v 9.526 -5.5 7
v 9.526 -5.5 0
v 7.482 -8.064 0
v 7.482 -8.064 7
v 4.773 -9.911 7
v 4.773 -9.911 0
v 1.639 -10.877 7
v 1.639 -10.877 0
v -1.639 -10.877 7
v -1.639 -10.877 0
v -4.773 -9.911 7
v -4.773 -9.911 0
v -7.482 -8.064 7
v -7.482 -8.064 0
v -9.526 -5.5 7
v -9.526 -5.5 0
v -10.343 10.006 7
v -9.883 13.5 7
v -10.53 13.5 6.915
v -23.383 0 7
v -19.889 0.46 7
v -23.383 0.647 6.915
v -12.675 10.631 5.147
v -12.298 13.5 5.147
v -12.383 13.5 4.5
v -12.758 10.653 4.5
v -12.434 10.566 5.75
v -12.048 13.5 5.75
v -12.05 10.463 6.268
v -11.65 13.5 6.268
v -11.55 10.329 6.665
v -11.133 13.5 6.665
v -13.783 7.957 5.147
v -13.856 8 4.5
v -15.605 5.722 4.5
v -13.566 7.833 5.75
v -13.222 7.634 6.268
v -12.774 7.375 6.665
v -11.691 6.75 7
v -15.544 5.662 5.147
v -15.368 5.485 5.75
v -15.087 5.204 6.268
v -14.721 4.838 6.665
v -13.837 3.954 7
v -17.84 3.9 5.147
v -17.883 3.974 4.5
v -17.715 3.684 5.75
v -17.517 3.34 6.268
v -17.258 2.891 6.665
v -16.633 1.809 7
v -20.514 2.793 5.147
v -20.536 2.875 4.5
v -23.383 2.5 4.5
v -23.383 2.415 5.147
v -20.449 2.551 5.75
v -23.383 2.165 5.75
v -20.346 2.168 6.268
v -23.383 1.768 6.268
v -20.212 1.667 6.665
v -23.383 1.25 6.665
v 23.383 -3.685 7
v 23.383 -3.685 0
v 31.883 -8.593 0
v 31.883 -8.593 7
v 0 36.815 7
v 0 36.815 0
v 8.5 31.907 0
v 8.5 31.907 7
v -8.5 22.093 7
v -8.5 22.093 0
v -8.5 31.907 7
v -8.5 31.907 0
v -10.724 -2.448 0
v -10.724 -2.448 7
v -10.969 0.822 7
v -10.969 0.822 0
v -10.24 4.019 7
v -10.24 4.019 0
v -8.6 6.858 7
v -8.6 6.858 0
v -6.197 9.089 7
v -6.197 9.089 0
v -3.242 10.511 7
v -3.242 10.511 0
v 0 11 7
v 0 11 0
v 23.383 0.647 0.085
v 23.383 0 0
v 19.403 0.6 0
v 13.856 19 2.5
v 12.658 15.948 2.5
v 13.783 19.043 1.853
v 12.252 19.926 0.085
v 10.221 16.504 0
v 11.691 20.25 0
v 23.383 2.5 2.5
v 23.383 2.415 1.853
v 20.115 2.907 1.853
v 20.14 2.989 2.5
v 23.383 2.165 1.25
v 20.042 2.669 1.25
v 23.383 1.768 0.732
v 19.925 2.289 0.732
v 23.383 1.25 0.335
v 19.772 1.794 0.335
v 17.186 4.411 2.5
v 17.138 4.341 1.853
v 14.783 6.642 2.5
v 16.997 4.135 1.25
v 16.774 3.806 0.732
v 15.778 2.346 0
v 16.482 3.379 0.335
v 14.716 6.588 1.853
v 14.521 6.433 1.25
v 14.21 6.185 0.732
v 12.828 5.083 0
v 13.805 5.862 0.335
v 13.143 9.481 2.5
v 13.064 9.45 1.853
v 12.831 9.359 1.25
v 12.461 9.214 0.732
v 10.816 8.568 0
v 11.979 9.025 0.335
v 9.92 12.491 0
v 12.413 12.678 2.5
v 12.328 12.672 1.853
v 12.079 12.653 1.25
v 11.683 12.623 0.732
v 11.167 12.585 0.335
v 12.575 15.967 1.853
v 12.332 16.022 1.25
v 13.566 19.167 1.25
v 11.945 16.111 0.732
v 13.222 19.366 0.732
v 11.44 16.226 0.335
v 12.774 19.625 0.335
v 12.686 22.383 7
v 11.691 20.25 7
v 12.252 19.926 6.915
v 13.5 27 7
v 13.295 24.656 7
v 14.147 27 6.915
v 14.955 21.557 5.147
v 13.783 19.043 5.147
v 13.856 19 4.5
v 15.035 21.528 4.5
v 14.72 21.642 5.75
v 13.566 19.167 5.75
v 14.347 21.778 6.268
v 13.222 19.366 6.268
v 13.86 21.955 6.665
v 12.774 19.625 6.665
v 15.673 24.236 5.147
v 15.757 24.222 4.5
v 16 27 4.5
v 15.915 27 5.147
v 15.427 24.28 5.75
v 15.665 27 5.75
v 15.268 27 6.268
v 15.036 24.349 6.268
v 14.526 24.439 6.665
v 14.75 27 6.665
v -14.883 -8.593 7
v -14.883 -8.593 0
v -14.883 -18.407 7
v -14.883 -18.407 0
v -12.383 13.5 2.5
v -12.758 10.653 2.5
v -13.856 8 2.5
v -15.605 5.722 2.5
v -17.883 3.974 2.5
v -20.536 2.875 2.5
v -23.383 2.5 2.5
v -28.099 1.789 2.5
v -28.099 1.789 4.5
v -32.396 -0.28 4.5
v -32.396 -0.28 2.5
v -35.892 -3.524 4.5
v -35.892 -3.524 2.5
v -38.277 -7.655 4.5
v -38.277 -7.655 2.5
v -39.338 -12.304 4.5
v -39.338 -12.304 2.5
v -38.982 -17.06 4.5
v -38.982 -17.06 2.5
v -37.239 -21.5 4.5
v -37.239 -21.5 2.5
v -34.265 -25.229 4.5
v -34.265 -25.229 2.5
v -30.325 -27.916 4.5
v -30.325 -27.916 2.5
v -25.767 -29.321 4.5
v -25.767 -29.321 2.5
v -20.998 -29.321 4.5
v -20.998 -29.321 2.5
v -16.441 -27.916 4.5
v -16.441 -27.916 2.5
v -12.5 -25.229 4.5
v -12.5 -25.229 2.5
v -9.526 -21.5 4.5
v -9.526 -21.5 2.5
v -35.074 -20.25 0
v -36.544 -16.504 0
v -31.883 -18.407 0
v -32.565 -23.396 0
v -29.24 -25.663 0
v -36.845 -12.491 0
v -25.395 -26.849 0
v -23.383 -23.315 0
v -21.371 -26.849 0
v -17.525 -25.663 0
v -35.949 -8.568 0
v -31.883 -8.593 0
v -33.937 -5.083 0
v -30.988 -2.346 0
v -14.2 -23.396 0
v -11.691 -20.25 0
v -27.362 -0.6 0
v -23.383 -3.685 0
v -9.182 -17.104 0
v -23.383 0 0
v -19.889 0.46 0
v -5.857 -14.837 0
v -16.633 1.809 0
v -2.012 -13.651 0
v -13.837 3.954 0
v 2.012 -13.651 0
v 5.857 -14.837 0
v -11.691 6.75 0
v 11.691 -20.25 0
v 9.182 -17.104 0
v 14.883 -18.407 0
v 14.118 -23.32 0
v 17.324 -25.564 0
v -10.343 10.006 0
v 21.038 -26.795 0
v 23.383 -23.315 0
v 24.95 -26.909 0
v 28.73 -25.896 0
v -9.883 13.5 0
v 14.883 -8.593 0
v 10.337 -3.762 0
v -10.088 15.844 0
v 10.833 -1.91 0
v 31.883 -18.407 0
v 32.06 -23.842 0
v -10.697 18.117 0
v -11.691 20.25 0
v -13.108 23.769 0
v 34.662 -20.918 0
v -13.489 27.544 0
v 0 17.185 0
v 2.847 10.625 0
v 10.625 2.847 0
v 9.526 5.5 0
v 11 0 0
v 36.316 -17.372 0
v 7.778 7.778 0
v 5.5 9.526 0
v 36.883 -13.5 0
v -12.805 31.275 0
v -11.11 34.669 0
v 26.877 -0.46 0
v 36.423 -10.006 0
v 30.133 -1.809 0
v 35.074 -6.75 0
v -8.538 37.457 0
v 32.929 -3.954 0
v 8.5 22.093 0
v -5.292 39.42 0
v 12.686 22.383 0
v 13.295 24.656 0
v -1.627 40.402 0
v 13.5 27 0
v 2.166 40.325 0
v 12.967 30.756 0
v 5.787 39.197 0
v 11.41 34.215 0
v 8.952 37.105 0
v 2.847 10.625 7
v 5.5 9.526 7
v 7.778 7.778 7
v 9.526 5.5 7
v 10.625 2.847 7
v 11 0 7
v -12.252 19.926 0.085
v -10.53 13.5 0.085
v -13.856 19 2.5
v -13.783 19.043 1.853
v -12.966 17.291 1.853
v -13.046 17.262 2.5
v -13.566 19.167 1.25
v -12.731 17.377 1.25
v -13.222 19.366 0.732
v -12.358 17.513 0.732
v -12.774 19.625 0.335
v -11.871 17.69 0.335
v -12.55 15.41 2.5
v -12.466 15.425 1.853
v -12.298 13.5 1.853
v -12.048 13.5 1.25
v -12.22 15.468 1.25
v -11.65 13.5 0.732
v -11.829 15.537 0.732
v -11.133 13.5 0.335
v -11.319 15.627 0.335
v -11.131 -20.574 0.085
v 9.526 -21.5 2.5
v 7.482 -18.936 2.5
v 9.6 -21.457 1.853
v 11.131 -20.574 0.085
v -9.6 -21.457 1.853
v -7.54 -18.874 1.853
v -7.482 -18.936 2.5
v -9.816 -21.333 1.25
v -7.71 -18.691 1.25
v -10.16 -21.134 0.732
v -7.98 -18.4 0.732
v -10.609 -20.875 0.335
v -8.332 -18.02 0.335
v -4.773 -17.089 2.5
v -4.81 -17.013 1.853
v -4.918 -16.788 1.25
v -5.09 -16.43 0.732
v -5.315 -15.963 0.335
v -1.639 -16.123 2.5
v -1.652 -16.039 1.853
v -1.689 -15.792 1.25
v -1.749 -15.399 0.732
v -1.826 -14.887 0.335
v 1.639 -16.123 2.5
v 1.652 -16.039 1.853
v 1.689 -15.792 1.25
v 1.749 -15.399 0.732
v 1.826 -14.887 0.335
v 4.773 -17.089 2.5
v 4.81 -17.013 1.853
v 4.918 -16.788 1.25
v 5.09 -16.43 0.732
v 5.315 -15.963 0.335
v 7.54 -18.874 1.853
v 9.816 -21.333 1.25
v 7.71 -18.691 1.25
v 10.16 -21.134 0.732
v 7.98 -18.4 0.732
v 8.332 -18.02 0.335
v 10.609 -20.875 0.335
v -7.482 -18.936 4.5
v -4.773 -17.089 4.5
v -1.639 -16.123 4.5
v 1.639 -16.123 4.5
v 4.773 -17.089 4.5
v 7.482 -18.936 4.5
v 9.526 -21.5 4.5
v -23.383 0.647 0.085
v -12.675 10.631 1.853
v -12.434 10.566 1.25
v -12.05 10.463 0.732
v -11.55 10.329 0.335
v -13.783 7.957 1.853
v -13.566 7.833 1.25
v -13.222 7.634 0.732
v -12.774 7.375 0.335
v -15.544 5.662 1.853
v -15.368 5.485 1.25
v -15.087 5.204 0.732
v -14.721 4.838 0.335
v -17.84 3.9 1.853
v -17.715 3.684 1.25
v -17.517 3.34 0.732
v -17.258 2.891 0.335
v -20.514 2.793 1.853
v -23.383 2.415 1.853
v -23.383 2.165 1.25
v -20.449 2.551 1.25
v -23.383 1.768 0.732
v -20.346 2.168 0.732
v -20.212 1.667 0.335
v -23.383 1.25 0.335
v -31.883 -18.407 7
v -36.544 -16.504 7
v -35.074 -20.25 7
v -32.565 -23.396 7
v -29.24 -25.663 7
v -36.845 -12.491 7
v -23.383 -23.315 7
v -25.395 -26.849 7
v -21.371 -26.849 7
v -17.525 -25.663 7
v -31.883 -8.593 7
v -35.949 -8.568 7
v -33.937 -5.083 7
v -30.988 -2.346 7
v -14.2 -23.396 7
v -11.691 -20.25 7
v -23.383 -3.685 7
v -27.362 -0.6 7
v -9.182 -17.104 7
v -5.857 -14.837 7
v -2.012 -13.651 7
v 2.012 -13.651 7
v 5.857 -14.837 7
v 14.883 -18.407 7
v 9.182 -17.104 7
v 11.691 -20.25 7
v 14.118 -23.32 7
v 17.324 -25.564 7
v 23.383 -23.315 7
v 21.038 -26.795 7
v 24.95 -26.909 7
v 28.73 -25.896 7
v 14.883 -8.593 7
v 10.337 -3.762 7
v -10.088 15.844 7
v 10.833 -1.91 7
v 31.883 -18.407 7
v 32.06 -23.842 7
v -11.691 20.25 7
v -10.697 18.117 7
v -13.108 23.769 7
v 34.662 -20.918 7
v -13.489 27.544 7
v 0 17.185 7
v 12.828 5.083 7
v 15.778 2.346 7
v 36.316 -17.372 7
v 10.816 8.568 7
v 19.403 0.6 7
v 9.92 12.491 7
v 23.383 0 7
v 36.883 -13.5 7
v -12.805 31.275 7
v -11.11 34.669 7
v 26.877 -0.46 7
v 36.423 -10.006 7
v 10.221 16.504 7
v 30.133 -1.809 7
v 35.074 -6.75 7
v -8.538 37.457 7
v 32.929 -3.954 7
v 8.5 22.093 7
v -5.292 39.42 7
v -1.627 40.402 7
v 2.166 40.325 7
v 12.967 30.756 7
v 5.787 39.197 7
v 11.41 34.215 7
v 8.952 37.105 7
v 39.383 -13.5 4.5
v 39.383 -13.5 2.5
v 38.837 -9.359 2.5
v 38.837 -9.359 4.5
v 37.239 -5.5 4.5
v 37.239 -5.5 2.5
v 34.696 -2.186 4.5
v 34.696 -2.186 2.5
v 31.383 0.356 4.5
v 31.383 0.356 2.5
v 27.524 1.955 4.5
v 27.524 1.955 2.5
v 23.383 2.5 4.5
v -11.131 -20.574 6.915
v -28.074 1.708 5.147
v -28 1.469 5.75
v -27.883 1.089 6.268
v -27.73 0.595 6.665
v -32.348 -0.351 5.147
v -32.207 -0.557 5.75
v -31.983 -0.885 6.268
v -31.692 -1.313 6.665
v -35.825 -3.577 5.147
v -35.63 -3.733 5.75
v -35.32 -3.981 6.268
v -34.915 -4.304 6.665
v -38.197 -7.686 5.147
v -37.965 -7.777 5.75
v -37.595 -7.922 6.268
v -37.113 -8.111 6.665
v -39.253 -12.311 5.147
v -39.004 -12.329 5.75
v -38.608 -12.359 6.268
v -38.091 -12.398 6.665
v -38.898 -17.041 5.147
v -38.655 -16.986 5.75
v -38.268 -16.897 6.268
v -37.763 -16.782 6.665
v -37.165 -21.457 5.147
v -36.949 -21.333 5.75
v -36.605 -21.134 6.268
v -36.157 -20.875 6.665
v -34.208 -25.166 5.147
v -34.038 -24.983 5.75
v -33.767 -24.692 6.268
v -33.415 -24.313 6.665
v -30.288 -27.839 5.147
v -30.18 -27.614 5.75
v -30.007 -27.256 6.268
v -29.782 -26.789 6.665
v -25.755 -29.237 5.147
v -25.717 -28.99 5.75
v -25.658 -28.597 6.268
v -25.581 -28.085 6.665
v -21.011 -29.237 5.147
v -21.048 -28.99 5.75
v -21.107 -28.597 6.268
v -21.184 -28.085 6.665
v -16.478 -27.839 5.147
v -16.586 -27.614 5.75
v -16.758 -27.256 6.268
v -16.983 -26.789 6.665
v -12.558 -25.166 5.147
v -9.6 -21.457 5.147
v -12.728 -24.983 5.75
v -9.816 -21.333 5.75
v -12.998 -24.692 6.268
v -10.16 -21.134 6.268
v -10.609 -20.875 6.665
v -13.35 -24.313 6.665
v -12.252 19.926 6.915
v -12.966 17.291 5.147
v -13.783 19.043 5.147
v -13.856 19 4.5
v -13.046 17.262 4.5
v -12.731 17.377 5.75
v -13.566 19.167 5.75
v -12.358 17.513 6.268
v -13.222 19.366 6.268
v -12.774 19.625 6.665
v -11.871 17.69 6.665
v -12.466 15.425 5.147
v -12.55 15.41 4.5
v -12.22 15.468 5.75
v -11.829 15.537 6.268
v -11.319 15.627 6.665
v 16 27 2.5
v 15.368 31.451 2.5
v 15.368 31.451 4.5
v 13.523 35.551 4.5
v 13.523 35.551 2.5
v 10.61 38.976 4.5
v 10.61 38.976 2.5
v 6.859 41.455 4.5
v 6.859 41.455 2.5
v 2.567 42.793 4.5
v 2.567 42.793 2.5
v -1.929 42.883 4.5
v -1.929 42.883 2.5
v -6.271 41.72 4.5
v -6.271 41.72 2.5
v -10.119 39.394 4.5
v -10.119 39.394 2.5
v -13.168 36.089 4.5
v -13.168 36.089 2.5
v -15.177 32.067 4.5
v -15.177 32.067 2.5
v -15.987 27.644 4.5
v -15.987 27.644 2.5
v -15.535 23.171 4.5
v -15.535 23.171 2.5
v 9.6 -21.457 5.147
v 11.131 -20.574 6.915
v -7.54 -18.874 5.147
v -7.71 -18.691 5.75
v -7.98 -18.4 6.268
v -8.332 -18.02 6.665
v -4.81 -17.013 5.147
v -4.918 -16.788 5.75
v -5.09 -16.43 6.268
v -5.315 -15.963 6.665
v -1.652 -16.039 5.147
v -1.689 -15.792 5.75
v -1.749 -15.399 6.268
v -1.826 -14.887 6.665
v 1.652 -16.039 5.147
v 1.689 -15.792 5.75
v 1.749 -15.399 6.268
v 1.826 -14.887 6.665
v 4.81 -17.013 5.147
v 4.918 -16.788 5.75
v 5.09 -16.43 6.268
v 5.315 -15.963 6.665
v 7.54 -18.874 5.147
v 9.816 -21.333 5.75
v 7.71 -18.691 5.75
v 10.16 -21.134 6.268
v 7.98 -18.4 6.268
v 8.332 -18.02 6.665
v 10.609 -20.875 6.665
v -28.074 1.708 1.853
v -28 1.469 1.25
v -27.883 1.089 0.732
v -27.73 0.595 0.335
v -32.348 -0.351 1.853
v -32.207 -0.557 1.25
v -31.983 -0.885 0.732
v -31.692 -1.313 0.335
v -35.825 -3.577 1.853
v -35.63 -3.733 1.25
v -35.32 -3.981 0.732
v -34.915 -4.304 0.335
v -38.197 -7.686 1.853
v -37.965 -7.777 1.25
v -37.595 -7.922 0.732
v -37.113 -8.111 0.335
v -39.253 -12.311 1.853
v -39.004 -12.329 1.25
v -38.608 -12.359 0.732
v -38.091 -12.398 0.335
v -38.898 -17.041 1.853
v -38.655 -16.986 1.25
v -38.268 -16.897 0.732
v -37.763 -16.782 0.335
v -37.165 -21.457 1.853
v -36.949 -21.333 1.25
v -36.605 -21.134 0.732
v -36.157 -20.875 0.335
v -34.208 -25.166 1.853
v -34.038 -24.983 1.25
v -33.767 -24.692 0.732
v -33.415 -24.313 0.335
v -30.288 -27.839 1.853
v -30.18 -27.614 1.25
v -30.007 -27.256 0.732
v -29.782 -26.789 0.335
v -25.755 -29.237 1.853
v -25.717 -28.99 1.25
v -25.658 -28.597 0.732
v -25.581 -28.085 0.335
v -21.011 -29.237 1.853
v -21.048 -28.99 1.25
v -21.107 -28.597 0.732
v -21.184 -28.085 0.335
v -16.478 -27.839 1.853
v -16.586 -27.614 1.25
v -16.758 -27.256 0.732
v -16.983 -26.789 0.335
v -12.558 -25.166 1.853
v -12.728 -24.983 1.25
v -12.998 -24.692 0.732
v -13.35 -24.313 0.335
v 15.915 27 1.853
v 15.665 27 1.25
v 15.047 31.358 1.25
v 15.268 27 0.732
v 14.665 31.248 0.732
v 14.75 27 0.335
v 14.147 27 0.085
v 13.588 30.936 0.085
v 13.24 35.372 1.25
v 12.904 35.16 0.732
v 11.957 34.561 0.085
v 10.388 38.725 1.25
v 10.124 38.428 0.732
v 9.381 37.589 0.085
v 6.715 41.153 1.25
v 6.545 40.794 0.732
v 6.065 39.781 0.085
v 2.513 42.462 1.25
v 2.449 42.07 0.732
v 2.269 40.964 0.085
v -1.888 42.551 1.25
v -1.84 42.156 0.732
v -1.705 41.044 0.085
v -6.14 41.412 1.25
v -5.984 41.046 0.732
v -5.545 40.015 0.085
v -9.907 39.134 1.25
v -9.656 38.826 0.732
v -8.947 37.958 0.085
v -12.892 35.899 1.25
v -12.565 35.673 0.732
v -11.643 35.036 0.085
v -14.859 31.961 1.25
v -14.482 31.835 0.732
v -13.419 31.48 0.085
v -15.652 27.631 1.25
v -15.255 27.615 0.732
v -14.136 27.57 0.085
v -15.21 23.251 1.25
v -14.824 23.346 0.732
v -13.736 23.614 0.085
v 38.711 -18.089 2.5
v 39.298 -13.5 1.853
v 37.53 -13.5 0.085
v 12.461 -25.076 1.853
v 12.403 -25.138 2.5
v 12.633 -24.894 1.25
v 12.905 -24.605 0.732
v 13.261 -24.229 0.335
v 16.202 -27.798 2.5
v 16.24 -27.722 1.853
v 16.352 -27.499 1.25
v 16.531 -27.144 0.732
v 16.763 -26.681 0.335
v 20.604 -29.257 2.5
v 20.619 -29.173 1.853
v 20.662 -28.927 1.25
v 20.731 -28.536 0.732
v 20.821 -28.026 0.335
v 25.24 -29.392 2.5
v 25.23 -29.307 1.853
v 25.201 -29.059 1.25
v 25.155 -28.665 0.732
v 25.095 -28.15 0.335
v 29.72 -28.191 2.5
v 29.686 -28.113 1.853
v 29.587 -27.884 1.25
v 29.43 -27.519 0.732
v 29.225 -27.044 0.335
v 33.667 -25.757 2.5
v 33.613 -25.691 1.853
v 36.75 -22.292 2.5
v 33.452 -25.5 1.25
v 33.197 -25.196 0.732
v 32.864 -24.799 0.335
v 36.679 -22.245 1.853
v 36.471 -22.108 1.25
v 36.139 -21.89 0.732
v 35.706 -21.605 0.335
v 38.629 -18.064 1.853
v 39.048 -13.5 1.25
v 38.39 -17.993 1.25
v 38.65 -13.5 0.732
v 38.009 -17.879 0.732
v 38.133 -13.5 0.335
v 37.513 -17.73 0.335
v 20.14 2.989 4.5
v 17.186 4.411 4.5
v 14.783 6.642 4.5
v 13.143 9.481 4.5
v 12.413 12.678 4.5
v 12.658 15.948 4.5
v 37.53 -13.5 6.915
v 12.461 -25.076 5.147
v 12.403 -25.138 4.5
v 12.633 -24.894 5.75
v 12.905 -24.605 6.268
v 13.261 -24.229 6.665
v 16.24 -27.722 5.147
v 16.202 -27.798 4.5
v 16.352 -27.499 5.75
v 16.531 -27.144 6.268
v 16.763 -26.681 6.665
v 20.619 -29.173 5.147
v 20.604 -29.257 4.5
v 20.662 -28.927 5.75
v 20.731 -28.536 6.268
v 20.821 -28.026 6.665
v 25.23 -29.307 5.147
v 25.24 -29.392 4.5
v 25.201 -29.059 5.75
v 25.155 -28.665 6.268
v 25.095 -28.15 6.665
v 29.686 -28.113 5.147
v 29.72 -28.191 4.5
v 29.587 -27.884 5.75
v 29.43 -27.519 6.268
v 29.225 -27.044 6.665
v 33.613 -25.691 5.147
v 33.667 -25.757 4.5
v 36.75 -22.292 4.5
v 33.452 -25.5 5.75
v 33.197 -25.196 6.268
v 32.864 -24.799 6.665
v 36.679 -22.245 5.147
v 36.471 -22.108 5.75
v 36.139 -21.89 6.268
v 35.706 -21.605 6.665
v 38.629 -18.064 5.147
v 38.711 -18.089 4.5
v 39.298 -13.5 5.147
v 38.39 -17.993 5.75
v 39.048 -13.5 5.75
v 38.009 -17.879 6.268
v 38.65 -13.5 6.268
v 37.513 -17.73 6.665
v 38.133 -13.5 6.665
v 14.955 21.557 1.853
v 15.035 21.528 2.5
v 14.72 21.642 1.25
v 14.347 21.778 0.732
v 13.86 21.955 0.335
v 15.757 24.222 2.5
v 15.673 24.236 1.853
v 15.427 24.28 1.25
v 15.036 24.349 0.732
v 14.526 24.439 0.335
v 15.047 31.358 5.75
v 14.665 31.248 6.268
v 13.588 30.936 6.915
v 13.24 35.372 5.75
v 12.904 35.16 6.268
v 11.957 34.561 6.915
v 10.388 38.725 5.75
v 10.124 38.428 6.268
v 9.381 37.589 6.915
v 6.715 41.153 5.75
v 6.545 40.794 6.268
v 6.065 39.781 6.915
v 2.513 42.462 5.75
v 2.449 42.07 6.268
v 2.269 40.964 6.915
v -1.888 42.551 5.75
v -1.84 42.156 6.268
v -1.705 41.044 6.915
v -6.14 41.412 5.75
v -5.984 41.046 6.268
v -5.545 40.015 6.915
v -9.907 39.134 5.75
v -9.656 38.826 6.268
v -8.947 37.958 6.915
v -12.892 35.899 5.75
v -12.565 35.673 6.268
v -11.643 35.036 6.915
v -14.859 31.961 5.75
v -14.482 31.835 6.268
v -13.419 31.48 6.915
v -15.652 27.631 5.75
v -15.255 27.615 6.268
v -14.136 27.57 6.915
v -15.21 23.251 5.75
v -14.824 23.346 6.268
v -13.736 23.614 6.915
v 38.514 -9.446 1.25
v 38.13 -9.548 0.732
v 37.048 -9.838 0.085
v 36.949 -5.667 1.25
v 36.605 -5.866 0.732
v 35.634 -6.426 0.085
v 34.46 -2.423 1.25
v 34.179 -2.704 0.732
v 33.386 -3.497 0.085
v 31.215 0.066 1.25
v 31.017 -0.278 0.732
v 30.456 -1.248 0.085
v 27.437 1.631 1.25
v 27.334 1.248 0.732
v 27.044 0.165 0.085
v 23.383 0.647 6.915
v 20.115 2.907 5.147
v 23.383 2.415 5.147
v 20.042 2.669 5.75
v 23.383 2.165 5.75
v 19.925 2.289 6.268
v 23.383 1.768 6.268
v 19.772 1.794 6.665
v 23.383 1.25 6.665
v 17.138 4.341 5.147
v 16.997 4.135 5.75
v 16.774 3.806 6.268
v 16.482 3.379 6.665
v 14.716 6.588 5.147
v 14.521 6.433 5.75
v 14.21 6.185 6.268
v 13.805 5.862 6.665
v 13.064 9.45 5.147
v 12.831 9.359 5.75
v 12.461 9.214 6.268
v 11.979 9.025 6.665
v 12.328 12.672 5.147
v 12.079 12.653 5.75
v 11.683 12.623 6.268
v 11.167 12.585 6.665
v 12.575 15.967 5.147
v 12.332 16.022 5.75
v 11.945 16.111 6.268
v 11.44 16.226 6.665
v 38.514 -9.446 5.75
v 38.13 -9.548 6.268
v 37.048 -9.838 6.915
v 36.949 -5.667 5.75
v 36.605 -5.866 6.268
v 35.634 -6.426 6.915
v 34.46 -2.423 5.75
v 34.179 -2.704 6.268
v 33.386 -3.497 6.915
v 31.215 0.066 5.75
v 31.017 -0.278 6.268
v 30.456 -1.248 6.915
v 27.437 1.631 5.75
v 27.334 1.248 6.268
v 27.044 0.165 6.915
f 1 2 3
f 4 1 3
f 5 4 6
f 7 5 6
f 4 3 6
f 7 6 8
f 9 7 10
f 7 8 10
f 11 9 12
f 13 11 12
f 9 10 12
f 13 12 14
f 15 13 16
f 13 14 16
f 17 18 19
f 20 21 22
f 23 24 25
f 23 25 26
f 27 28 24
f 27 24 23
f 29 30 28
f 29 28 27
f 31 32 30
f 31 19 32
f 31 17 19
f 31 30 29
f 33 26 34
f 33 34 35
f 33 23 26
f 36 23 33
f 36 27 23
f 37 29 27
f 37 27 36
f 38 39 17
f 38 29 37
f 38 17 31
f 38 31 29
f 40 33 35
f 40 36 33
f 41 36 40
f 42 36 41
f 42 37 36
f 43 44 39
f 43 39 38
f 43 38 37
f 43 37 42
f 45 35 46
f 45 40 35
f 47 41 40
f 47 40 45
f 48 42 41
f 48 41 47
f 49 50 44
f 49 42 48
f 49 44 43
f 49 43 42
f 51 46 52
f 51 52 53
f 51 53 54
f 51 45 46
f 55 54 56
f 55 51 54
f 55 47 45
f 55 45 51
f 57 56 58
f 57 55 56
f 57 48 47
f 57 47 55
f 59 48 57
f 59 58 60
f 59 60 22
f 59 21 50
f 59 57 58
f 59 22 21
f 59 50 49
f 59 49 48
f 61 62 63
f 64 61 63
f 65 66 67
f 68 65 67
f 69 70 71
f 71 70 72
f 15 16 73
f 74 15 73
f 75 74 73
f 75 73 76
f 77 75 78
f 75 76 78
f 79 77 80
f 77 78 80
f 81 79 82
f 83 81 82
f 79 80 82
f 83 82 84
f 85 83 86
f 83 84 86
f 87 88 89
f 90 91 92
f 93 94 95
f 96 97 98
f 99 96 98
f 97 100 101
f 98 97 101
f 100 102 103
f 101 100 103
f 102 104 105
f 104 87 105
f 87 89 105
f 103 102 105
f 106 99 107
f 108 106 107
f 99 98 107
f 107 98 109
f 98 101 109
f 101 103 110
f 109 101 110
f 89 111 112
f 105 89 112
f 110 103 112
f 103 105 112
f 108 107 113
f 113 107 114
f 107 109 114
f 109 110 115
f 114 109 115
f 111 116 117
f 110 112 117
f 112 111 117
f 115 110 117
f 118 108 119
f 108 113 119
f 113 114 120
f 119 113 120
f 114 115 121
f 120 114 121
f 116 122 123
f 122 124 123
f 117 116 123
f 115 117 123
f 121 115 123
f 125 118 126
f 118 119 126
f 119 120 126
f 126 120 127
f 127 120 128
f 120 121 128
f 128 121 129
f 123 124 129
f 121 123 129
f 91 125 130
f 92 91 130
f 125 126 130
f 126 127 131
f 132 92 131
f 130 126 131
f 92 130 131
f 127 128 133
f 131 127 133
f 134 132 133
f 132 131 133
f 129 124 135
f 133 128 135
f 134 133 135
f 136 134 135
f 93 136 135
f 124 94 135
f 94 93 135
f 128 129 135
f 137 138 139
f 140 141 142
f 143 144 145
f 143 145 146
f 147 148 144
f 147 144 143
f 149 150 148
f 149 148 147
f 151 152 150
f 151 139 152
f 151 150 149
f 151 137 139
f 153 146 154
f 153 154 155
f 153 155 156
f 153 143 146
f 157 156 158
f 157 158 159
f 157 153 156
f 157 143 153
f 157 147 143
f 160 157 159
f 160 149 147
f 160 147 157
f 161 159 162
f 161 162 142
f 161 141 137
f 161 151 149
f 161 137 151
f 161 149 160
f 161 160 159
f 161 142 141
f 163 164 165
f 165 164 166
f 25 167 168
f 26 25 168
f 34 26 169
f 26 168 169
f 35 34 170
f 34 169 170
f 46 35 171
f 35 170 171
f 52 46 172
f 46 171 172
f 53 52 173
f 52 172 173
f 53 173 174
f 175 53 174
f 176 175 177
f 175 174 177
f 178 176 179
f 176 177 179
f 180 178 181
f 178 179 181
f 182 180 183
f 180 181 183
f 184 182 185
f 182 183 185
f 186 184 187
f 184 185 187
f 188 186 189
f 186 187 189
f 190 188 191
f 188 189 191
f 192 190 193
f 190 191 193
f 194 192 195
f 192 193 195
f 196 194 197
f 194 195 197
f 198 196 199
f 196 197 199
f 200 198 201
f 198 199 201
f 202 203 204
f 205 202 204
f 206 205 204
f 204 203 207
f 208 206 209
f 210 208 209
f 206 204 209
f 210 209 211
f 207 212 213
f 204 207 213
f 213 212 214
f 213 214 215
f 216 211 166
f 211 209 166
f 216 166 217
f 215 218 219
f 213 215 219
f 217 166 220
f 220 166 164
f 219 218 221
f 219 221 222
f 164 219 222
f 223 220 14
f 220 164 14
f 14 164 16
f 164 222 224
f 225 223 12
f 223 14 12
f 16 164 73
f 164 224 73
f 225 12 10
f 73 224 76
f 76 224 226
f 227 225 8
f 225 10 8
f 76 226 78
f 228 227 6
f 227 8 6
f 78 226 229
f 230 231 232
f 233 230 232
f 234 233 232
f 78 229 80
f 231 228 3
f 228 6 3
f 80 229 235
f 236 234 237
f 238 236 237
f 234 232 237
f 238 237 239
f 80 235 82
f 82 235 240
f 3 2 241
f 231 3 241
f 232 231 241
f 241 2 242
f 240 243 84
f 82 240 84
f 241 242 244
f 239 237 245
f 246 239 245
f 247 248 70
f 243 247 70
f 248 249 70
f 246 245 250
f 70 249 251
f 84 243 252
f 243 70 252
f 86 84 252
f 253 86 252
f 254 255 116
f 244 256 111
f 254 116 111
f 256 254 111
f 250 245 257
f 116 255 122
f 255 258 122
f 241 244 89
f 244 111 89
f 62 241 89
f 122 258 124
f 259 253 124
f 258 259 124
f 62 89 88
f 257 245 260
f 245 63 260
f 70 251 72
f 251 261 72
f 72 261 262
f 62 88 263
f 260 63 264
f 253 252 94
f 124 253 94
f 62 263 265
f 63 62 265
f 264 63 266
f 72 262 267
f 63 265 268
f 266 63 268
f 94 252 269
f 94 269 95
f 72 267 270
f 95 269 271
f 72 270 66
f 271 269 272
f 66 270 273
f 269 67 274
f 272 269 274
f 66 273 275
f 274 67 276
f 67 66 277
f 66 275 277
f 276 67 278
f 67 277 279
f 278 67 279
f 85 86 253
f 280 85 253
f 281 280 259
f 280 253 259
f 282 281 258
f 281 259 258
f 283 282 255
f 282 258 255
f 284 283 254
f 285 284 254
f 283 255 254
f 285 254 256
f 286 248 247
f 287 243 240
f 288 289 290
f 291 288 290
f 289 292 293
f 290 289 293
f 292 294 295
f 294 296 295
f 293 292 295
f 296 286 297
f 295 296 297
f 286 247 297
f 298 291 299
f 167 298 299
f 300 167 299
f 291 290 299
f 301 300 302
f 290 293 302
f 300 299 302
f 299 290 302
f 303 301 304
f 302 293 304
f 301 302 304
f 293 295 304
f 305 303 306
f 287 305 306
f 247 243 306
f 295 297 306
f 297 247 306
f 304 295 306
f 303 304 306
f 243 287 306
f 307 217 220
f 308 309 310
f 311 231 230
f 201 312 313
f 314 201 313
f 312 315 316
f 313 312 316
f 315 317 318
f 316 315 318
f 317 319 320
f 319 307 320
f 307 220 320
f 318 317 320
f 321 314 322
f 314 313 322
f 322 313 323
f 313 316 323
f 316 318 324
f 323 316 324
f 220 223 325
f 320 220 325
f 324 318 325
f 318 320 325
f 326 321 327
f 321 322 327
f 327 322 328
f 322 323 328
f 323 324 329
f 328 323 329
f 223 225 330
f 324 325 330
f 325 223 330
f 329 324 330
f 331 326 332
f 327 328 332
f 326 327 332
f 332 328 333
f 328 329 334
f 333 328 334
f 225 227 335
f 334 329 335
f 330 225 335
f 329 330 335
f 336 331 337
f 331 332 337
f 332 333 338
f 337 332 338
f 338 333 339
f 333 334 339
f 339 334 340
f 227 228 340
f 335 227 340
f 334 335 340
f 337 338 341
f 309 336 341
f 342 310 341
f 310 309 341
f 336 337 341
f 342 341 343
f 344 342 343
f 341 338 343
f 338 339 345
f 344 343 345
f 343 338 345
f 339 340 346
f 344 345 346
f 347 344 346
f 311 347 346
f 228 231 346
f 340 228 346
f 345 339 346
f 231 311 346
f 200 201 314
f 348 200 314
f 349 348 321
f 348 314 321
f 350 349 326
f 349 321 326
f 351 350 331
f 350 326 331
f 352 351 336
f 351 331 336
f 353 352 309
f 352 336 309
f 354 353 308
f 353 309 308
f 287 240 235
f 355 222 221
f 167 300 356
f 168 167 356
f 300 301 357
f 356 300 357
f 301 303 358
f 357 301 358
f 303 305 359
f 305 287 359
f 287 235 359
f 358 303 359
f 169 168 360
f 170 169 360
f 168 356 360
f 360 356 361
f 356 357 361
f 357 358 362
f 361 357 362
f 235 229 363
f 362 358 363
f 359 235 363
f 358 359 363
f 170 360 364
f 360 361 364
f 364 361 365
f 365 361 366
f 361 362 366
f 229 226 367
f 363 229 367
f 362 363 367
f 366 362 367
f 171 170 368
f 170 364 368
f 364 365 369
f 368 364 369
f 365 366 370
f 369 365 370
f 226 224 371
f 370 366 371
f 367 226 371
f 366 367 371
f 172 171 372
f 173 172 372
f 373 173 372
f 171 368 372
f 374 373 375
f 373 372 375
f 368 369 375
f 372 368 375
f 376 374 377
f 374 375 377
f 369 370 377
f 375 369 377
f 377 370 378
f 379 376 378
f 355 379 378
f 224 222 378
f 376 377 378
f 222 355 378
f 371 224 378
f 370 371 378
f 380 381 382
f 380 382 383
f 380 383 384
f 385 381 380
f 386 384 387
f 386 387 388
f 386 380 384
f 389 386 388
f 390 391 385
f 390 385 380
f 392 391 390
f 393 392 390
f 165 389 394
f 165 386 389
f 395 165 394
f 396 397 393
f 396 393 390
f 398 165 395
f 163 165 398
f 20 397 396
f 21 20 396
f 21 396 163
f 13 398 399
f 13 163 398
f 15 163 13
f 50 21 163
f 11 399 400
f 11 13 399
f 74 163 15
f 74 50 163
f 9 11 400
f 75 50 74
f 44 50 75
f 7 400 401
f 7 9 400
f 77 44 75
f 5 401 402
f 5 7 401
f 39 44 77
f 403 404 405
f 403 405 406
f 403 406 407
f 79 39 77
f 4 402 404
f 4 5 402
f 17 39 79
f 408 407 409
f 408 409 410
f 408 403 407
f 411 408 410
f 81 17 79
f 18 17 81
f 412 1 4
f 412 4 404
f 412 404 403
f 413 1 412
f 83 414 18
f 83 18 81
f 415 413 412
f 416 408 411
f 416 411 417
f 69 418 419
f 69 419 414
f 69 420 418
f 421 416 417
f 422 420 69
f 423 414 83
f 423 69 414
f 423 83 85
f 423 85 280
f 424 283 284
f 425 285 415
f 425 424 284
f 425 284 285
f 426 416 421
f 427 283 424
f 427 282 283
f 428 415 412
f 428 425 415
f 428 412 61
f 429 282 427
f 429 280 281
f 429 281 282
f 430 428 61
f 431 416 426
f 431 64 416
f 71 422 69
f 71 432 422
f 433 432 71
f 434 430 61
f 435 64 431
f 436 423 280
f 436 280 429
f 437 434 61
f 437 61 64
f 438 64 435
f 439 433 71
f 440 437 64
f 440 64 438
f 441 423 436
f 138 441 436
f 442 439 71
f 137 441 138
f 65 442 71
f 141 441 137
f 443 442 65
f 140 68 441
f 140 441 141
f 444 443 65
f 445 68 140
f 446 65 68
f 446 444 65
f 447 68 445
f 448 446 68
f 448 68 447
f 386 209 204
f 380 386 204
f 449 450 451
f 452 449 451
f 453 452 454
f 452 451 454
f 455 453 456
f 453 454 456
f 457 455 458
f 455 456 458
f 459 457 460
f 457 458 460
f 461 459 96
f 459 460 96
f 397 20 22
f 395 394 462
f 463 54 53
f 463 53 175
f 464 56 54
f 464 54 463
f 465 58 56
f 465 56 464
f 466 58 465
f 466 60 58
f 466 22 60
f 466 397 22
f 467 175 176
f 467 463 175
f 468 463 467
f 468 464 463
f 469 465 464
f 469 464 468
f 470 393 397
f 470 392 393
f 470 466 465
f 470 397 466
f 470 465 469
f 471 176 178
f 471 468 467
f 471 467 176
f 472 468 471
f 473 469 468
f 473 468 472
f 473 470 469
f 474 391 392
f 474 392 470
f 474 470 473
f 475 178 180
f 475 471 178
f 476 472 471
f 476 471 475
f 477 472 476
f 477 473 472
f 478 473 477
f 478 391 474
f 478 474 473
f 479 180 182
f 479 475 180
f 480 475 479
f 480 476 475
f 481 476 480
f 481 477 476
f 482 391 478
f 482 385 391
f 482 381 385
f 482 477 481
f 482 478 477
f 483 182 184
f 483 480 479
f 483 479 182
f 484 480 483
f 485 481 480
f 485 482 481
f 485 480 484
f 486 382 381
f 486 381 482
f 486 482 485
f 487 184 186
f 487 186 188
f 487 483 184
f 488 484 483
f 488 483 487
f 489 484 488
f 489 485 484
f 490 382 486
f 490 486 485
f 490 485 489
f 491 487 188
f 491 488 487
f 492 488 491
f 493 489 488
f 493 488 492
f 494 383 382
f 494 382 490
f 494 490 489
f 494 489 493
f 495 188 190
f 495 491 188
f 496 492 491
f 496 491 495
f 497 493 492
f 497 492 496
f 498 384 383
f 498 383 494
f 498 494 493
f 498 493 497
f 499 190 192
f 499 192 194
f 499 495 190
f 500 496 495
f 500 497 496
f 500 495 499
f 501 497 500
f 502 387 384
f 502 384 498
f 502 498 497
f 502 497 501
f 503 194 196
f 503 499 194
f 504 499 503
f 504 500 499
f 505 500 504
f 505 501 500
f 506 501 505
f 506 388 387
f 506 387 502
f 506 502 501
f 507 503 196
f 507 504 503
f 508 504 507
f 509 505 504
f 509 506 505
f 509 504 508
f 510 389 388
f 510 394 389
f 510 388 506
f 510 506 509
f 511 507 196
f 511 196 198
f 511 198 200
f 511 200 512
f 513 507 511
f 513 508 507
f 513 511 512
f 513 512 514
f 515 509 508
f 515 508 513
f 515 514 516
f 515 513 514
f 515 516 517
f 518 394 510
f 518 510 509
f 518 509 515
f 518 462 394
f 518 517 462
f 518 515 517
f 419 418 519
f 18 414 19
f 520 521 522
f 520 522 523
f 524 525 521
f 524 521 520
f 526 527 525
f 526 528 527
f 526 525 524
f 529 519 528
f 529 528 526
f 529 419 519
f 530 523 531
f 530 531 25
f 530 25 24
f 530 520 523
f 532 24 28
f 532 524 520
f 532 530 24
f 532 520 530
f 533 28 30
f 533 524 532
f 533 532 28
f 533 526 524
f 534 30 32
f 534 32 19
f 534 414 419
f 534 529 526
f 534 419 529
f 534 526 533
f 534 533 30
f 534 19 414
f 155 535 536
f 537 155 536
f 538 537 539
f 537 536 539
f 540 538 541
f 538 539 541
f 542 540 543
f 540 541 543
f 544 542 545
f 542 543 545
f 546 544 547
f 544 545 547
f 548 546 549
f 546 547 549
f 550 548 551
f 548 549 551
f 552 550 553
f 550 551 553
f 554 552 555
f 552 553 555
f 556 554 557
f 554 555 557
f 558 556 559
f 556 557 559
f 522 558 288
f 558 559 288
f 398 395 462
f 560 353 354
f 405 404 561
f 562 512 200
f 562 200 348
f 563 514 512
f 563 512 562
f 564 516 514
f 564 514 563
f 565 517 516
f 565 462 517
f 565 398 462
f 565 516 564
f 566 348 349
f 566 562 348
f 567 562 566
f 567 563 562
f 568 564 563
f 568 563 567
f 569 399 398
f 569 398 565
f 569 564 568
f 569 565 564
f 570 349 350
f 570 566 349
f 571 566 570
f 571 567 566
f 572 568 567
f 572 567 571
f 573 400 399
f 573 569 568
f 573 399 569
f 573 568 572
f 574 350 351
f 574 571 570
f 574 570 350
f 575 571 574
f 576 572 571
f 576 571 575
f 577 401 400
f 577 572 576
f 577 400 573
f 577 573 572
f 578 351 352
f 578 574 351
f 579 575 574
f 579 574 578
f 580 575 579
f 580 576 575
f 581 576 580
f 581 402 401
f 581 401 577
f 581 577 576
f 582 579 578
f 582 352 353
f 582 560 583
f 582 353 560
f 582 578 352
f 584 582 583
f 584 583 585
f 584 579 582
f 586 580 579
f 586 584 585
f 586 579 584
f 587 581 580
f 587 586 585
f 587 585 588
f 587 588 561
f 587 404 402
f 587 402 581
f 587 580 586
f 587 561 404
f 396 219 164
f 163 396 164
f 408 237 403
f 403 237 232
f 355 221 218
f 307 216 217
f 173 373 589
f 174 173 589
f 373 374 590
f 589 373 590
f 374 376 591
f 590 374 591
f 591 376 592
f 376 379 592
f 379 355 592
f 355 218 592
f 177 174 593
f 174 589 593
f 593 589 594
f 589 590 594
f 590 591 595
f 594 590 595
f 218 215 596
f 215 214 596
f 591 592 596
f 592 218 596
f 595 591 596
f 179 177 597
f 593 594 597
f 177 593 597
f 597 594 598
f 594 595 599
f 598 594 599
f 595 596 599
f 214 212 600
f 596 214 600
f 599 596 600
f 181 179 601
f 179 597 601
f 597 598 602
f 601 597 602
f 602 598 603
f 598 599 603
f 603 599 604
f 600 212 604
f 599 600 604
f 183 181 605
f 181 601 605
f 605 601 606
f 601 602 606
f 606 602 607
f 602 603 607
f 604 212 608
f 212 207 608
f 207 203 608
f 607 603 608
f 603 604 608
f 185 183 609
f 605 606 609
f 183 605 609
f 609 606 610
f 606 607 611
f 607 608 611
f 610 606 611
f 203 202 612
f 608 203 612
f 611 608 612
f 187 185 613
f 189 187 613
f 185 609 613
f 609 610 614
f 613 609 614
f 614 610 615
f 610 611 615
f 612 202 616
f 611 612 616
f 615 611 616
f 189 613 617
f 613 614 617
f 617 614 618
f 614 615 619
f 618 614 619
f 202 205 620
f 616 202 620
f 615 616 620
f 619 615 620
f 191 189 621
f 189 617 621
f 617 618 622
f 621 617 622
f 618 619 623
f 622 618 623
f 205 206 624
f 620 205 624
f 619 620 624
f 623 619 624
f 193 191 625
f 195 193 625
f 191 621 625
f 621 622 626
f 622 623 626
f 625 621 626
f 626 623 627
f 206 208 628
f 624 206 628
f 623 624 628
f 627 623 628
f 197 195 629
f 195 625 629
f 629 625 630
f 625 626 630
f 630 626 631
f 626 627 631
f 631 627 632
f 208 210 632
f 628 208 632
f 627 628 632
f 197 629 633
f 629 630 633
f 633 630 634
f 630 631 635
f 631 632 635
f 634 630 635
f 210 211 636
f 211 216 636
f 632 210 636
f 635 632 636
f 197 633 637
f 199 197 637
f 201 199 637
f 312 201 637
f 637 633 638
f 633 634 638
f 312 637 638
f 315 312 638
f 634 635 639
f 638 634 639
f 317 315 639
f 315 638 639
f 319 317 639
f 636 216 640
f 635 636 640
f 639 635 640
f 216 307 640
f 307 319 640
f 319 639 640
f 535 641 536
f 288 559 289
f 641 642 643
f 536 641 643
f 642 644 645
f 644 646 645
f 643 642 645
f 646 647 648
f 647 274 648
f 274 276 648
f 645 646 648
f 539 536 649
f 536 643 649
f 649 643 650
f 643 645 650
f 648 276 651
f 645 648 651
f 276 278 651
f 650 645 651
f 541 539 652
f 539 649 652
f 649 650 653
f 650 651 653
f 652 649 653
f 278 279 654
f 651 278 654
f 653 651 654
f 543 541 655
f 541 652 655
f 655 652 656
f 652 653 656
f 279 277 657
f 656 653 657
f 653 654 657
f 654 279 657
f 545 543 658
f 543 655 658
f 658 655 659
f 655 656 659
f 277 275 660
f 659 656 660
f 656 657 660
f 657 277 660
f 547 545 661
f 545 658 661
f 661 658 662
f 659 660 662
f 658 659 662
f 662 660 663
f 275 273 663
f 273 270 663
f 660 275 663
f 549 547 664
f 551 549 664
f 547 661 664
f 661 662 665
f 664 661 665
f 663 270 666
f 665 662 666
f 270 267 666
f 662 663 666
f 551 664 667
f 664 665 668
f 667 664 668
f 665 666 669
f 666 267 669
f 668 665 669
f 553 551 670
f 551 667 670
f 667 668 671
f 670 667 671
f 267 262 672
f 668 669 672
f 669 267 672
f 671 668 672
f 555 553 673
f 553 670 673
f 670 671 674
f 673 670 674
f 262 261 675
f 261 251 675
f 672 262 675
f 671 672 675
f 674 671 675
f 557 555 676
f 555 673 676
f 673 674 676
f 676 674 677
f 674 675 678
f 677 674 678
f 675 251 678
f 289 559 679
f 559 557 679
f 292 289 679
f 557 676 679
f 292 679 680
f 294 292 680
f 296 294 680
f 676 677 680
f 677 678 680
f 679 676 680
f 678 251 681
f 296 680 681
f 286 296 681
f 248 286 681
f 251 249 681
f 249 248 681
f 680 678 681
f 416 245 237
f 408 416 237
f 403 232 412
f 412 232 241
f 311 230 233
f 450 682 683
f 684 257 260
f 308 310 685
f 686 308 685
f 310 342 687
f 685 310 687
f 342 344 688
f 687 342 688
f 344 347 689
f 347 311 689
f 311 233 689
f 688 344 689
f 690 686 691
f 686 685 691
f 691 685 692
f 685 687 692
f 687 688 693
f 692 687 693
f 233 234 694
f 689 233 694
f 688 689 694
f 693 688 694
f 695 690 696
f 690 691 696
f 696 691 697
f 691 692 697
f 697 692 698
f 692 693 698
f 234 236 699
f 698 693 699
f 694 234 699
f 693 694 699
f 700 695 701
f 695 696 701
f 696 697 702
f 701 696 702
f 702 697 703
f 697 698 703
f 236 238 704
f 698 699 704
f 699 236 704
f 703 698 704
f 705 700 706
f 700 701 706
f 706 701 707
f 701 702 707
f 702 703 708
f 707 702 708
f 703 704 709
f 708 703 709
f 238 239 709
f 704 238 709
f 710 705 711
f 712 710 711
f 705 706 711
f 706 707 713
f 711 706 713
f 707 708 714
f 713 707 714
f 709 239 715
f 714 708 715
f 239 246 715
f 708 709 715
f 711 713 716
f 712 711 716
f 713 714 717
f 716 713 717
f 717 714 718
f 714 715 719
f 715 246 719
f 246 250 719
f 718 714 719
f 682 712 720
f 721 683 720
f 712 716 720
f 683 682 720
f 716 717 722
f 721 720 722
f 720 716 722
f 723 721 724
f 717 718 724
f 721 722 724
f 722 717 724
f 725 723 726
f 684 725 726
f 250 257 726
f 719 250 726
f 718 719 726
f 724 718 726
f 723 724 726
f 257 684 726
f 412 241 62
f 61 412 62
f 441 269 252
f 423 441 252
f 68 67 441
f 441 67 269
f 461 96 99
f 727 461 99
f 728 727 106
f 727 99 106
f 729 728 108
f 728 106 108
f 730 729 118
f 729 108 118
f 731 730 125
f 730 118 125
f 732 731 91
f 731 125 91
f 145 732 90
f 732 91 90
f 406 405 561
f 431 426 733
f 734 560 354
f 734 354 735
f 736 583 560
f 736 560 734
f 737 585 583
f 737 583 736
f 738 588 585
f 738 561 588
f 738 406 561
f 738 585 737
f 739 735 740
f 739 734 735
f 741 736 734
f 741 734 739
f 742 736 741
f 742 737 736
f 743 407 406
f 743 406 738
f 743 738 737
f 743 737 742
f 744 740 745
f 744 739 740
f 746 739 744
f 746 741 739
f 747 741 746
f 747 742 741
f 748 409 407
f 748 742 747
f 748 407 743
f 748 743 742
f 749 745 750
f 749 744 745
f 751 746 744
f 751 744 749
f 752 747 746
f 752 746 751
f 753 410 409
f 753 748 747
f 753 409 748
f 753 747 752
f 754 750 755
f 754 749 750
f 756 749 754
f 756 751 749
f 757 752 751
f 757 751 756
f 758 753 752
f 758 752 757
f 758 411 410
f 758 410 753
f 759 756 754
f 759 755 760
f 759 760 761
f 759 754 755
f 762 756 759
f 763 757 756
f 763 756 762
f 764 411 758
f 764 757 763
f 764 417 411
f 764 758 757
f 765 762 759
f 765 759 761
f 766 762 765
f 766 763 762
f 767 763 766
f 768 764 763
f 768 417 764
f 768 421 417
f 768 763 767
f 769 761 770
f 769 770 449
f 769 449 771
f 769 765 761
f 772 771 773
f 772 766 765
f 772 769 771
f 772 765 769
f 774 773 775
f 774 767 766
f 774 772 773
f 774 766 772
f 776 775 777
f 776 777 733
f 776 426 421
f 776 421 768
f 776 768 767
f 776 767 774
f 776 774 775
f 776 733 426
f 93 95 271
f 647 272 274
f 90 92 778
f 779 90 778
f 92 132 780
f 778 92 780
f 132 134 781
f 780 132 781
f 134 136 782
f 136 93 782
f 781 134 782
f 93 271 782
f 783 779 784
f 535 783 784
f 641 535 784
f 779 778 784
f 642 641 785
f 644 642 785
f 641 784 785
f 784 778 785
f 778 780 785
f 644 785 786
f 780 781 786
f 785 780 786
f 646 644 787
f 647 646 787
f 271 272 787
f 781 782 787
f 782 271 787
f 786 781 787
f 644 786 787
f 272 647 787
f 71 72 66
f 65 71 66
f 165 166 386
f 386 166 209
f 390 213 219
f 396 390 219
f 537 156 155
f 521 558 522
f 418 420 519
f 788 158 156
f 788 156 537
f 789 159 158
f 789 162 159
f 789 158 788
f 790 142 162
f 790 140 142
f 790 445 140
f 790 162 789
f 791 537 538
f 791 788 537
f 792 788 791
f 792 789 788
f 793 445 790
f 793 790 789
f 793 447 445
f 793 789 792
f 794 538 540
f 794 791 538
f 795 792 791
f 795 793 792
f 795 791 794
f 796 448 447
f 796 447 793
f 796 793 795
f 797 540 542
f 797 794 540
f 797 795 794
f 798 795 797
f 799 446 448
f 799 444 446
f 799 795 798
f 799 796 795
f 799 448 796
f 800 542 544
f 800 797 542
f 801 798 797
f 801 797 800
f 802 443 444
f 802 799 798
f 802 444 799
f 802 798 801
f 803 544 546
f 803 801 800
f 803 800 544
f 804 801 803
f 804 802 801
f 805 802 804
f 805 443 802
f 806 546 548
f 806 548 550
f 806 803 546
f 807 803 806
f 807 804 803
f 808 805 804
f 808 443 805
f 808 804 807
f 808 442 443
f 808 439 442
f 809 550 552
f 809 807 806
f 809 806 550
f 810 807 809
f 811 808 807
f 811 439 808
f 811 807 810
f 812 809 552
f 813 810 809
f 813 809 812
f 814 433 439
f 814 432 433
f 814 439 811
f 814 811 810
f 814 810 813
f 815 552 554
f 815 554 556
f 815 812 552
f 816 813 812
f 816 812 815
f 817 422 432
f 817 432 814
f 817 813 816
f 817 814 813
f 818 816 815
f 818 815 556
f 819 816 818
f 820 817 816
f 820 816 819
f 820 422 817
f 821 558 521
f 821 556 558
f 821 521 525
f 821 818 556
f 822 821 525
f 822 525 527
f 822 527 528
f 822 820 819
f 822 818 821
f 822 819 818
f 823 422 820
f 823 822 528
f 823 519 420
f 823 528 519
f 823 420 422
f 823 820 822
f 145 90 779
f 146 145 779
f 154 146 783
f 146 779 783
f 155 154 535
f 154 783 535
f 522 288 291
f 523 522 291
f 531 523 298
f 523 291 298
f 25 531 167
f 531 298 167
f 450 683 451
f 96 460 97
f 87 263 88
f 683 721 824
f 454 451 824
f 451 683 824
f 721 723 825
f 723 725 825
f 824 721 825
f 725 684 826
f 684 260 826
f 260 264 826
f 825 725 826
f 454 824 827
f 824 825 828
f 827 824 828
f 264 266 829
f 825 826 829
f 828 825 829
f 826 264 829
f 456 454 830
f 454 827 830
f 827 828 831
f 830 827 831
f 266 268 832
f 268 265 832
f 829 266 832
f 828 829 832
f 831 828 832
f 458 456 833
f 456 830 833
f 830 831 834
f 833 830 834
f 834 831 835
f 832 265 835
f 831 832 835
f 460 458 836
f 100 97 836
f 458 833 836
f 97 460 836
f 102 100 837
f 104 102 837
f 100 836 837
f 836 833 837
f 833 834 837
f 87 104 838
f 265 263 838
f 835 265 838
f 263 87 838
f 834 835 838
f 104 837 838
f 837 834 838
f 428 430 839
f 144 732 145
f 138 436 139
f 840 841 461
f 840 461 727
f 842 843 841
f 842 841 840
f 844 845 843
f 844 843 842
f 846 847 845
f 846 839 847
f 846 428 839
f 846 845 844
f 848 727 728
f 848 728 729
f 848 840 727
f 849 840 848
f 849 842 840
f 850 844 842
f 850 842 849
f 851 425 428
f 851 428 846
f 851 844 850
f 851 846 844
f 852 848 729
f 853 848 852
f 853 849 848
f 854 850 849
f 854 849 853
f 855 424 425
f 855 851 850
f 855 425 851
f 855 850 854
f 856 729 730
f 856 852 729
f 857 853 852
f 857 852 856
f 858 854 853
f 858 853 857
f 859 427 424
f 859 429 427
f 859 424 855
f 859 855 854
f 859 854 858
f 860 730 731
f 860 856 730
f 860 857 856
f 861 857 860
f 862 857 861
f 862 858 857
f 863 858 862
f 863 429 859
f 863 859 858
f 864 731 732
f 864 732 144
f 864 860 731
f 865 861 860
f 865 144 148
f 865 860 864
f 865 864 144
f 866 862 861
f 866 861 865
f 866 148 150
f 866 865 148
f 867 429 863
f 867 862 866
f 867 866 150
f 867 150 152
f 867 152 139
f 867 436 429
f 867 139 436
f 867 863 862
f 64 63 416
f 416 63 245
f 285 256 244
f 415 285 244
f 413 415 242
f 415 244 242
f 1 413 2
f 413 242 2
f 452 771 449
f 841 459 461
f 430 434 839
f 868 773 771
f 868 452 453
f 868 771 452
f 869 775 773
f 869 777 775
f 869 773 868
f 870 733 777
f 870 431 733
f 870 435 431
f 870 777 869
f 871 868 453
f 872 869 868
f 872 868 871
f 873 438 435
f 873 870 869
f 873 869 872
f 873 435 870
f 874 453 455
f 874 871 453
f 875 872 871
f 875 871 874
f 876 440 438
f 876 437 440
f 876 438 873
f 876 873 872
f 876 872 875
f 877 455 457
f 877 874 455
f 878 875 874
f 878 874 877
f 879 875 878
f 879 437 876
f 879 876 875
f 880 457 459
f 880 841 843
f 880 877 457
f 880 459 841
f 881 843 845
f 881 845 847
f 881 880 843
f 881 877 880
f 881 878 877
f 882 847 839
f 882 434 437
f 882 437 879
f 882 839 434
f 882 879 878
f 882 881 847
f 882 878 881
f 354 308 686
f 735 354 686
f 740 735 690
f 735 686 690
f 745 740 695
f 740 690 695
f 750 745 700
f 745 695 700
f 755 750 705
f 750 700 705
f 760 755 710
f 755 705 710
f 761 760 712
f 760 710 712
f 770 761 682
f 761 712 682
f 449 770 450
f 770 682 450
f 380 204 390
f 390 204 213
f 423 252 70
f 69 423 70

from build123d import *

# Parameters (mm, degrees)
F1_DEPTH = 7
F2_R     = 2.5


with BuildPart() as f1:
    # F0 (on Top) → F1 (new body)
    with BuildSketch(Plane.XY):
        with BuildLine():
            ThreePointArc((-9.5262794581, -5.4999999715), (-9.5262794251, 5.5000000286), (3.3e-08, 11))
            ThreePointArc((3.3e-08, 11), (-7.9999998612, 13.1435934593), (-13.8564063169, 18.9999997511))
            ThreePointArc((-13.8564063169, 18.9999997511), (-12.7575017758, 16.3470093573), (-12.3826859022, 13.5))
            ThreePointArc((-12.3826859022, 13.5), (-15.6045113091, 5.7218254069), (-23.3826859022, 2.5))
            ThreePointArc((-23.3826859022, 2.5), (-15.3826859164, 0.3564064688), (-9.5262794581, -5.4999999715))
        make_face()
        with BuildLine():
            ThreePointArc((-13.8564063169, 18.9999997511), (-7.9999998612, 13.1435934593), (3.3e-08, 11))
            ThreePointArc((3.3e-08, 11), (8.0000000671, 13.1435935782), (13.8564065215, 19.0000001056))
            ThreePointArc((13.8564065215, 19.0000001056), (15.4548132364, 22.8588953372), (16, 27))
            ThreePointArc((16, 27), (-4.1411048604, 42.4548131834), (-13.8564063169, 18.9999997511))
        make_face()
        Polygon((0, 36.8149545762), (8.5, 31.9074772881), (8.5, 22.0925227119), (0, 17.1850454238), (-8.5, 22.0925227119), (-8.5, 31.9074772881), align=None, mode=Mode.SUBTRACT)
        with BuildLine():
            ThreePointArc((3.3e-08, 11), (7.7781746047, 7.7781745814), (11, 0))
            ThreePointArc((11, 0), (10.6251840805, -2.8470095287), (9.5262794079, -5.5000000584))
            ThreePointArc((9.5262794079, -5.5000000584), (15.382685873, 0.3564064437), (23.3826859022, 2.5))
            ThreePointArc((23.3826859022, 2.5), (13.8564064301, 8.0000000528), (13.8564065215, 19.0000001056))
            ThreePointArc((13.8564065215, 19.0000001056), (8.0000000671, 13.1435935782), (3.3e-08, 11))
        make_face()
        with BuildLine():
            ThreePointArc((23.3826859022, 2.5), (15.382685873, 0.3564064437), (9.5262794079, -5.5000000584))
            ThreePointArc((9.5262794079, -5.5000000584), (7.3826859022, -13.5000000639), (9.5262794719, -21.5000000524))
            ThreePointArc((9.5262794719, -21.5000000524), (27.523790653, -28.9548132128), (39.3826859022, -13.5))
            ThreePointArc((39.3826859022, -13.5), (34.6963944012, -2.186291501), (23.3826859022, 2.5))
        make_face()
        Polygon((14.8826859022, -8.5925227119), (23.3826859022, -3.6850454238), (31.8826859022, -8.5925227119), (31.8826859022, -18.4074772881), (23.3826859022, -23.3149545762), (14.8826859022, -18.4074772881), align=None, mode=Mode.SUBTRACT)
        with BuildLine():
            ThreePointArc((9.5262794719, -21.5000000524), (7.3826859022, -13.5000000639), (9.5262794079, -5.5000000584))
            ThreePointArc((9.5262794079, -5.5000000584), (-5.02e-08, -11), (-9.5262794581, -5.4999999715))
            ThreePointArc((-9.5262794581, -5.4999999715), (-7.9278726858, -9.3588952624), (-7.3826859022, -13.5))
            ThreePointArc((-7.3826859022, -13.5), (-7.9278726602, -17.641104642), (-9.5262793592, -21.4999998571))
            ThreePointArc((-9.5262793592, -21.4999998571), (1.127e-07, -16), (9.5262794719, -21.5000000524))
        make_face()
        with BuildLine():
            ThreePointArc((-7.3826859022, -13.5), (-7.9278726858, -9.3588952624), (-9.5262794581, -5.4999999715))
            ThreePointArc((-9.5262794581, -5.4999999715), (-15.3826859164, 0.3564064688), (-23.3826859022, 2.5))
            ThreePointArc((-23.3826859022, 2.5), (-37.2390923215, -21.5000000714), (-9.5262793592, -21.4999998571))
            ThreePointArc((-9.5262793592, -21.4999998571), (-7.9278726602, -17.641104642), (-7.3826859022, -13.5))
        make_face()
        Polygon((-23.3826859022, -3.6850454238), (-14.8826859022, -8.5925227119), (-14.8826859022, -18.4074772881), (-23.3826859022, -23.3149545762), (-31.8826859022, -18.4074772881), (-31.8826859022, -8.5925227119), align=None, mode=Mode.SUBTRACT)
    extrude(amount=F1_DEPTH)

    # F2
    f2_edges = [f1.edges().sort_by_distance(p)[0] for p in [
        (0, 43, 7),
        (0, 43, 0),
        (13.856406, 8, 7),
        (13.856406, 8, 0),
        (37.239092, -21.5, 0),
        (37.239092, -21.5, 7),
        (0, -16, 7),
        (0, -16, 0),
        (-37.239092, -21.5, 0),
        (-37.239092, -21.5, 7),
        (-13.856407, 8, 7),
        (-13.856407, 8, 0),
    ]]
    fillet(f2_edges, radius=F2_R)


solid = f1.part
